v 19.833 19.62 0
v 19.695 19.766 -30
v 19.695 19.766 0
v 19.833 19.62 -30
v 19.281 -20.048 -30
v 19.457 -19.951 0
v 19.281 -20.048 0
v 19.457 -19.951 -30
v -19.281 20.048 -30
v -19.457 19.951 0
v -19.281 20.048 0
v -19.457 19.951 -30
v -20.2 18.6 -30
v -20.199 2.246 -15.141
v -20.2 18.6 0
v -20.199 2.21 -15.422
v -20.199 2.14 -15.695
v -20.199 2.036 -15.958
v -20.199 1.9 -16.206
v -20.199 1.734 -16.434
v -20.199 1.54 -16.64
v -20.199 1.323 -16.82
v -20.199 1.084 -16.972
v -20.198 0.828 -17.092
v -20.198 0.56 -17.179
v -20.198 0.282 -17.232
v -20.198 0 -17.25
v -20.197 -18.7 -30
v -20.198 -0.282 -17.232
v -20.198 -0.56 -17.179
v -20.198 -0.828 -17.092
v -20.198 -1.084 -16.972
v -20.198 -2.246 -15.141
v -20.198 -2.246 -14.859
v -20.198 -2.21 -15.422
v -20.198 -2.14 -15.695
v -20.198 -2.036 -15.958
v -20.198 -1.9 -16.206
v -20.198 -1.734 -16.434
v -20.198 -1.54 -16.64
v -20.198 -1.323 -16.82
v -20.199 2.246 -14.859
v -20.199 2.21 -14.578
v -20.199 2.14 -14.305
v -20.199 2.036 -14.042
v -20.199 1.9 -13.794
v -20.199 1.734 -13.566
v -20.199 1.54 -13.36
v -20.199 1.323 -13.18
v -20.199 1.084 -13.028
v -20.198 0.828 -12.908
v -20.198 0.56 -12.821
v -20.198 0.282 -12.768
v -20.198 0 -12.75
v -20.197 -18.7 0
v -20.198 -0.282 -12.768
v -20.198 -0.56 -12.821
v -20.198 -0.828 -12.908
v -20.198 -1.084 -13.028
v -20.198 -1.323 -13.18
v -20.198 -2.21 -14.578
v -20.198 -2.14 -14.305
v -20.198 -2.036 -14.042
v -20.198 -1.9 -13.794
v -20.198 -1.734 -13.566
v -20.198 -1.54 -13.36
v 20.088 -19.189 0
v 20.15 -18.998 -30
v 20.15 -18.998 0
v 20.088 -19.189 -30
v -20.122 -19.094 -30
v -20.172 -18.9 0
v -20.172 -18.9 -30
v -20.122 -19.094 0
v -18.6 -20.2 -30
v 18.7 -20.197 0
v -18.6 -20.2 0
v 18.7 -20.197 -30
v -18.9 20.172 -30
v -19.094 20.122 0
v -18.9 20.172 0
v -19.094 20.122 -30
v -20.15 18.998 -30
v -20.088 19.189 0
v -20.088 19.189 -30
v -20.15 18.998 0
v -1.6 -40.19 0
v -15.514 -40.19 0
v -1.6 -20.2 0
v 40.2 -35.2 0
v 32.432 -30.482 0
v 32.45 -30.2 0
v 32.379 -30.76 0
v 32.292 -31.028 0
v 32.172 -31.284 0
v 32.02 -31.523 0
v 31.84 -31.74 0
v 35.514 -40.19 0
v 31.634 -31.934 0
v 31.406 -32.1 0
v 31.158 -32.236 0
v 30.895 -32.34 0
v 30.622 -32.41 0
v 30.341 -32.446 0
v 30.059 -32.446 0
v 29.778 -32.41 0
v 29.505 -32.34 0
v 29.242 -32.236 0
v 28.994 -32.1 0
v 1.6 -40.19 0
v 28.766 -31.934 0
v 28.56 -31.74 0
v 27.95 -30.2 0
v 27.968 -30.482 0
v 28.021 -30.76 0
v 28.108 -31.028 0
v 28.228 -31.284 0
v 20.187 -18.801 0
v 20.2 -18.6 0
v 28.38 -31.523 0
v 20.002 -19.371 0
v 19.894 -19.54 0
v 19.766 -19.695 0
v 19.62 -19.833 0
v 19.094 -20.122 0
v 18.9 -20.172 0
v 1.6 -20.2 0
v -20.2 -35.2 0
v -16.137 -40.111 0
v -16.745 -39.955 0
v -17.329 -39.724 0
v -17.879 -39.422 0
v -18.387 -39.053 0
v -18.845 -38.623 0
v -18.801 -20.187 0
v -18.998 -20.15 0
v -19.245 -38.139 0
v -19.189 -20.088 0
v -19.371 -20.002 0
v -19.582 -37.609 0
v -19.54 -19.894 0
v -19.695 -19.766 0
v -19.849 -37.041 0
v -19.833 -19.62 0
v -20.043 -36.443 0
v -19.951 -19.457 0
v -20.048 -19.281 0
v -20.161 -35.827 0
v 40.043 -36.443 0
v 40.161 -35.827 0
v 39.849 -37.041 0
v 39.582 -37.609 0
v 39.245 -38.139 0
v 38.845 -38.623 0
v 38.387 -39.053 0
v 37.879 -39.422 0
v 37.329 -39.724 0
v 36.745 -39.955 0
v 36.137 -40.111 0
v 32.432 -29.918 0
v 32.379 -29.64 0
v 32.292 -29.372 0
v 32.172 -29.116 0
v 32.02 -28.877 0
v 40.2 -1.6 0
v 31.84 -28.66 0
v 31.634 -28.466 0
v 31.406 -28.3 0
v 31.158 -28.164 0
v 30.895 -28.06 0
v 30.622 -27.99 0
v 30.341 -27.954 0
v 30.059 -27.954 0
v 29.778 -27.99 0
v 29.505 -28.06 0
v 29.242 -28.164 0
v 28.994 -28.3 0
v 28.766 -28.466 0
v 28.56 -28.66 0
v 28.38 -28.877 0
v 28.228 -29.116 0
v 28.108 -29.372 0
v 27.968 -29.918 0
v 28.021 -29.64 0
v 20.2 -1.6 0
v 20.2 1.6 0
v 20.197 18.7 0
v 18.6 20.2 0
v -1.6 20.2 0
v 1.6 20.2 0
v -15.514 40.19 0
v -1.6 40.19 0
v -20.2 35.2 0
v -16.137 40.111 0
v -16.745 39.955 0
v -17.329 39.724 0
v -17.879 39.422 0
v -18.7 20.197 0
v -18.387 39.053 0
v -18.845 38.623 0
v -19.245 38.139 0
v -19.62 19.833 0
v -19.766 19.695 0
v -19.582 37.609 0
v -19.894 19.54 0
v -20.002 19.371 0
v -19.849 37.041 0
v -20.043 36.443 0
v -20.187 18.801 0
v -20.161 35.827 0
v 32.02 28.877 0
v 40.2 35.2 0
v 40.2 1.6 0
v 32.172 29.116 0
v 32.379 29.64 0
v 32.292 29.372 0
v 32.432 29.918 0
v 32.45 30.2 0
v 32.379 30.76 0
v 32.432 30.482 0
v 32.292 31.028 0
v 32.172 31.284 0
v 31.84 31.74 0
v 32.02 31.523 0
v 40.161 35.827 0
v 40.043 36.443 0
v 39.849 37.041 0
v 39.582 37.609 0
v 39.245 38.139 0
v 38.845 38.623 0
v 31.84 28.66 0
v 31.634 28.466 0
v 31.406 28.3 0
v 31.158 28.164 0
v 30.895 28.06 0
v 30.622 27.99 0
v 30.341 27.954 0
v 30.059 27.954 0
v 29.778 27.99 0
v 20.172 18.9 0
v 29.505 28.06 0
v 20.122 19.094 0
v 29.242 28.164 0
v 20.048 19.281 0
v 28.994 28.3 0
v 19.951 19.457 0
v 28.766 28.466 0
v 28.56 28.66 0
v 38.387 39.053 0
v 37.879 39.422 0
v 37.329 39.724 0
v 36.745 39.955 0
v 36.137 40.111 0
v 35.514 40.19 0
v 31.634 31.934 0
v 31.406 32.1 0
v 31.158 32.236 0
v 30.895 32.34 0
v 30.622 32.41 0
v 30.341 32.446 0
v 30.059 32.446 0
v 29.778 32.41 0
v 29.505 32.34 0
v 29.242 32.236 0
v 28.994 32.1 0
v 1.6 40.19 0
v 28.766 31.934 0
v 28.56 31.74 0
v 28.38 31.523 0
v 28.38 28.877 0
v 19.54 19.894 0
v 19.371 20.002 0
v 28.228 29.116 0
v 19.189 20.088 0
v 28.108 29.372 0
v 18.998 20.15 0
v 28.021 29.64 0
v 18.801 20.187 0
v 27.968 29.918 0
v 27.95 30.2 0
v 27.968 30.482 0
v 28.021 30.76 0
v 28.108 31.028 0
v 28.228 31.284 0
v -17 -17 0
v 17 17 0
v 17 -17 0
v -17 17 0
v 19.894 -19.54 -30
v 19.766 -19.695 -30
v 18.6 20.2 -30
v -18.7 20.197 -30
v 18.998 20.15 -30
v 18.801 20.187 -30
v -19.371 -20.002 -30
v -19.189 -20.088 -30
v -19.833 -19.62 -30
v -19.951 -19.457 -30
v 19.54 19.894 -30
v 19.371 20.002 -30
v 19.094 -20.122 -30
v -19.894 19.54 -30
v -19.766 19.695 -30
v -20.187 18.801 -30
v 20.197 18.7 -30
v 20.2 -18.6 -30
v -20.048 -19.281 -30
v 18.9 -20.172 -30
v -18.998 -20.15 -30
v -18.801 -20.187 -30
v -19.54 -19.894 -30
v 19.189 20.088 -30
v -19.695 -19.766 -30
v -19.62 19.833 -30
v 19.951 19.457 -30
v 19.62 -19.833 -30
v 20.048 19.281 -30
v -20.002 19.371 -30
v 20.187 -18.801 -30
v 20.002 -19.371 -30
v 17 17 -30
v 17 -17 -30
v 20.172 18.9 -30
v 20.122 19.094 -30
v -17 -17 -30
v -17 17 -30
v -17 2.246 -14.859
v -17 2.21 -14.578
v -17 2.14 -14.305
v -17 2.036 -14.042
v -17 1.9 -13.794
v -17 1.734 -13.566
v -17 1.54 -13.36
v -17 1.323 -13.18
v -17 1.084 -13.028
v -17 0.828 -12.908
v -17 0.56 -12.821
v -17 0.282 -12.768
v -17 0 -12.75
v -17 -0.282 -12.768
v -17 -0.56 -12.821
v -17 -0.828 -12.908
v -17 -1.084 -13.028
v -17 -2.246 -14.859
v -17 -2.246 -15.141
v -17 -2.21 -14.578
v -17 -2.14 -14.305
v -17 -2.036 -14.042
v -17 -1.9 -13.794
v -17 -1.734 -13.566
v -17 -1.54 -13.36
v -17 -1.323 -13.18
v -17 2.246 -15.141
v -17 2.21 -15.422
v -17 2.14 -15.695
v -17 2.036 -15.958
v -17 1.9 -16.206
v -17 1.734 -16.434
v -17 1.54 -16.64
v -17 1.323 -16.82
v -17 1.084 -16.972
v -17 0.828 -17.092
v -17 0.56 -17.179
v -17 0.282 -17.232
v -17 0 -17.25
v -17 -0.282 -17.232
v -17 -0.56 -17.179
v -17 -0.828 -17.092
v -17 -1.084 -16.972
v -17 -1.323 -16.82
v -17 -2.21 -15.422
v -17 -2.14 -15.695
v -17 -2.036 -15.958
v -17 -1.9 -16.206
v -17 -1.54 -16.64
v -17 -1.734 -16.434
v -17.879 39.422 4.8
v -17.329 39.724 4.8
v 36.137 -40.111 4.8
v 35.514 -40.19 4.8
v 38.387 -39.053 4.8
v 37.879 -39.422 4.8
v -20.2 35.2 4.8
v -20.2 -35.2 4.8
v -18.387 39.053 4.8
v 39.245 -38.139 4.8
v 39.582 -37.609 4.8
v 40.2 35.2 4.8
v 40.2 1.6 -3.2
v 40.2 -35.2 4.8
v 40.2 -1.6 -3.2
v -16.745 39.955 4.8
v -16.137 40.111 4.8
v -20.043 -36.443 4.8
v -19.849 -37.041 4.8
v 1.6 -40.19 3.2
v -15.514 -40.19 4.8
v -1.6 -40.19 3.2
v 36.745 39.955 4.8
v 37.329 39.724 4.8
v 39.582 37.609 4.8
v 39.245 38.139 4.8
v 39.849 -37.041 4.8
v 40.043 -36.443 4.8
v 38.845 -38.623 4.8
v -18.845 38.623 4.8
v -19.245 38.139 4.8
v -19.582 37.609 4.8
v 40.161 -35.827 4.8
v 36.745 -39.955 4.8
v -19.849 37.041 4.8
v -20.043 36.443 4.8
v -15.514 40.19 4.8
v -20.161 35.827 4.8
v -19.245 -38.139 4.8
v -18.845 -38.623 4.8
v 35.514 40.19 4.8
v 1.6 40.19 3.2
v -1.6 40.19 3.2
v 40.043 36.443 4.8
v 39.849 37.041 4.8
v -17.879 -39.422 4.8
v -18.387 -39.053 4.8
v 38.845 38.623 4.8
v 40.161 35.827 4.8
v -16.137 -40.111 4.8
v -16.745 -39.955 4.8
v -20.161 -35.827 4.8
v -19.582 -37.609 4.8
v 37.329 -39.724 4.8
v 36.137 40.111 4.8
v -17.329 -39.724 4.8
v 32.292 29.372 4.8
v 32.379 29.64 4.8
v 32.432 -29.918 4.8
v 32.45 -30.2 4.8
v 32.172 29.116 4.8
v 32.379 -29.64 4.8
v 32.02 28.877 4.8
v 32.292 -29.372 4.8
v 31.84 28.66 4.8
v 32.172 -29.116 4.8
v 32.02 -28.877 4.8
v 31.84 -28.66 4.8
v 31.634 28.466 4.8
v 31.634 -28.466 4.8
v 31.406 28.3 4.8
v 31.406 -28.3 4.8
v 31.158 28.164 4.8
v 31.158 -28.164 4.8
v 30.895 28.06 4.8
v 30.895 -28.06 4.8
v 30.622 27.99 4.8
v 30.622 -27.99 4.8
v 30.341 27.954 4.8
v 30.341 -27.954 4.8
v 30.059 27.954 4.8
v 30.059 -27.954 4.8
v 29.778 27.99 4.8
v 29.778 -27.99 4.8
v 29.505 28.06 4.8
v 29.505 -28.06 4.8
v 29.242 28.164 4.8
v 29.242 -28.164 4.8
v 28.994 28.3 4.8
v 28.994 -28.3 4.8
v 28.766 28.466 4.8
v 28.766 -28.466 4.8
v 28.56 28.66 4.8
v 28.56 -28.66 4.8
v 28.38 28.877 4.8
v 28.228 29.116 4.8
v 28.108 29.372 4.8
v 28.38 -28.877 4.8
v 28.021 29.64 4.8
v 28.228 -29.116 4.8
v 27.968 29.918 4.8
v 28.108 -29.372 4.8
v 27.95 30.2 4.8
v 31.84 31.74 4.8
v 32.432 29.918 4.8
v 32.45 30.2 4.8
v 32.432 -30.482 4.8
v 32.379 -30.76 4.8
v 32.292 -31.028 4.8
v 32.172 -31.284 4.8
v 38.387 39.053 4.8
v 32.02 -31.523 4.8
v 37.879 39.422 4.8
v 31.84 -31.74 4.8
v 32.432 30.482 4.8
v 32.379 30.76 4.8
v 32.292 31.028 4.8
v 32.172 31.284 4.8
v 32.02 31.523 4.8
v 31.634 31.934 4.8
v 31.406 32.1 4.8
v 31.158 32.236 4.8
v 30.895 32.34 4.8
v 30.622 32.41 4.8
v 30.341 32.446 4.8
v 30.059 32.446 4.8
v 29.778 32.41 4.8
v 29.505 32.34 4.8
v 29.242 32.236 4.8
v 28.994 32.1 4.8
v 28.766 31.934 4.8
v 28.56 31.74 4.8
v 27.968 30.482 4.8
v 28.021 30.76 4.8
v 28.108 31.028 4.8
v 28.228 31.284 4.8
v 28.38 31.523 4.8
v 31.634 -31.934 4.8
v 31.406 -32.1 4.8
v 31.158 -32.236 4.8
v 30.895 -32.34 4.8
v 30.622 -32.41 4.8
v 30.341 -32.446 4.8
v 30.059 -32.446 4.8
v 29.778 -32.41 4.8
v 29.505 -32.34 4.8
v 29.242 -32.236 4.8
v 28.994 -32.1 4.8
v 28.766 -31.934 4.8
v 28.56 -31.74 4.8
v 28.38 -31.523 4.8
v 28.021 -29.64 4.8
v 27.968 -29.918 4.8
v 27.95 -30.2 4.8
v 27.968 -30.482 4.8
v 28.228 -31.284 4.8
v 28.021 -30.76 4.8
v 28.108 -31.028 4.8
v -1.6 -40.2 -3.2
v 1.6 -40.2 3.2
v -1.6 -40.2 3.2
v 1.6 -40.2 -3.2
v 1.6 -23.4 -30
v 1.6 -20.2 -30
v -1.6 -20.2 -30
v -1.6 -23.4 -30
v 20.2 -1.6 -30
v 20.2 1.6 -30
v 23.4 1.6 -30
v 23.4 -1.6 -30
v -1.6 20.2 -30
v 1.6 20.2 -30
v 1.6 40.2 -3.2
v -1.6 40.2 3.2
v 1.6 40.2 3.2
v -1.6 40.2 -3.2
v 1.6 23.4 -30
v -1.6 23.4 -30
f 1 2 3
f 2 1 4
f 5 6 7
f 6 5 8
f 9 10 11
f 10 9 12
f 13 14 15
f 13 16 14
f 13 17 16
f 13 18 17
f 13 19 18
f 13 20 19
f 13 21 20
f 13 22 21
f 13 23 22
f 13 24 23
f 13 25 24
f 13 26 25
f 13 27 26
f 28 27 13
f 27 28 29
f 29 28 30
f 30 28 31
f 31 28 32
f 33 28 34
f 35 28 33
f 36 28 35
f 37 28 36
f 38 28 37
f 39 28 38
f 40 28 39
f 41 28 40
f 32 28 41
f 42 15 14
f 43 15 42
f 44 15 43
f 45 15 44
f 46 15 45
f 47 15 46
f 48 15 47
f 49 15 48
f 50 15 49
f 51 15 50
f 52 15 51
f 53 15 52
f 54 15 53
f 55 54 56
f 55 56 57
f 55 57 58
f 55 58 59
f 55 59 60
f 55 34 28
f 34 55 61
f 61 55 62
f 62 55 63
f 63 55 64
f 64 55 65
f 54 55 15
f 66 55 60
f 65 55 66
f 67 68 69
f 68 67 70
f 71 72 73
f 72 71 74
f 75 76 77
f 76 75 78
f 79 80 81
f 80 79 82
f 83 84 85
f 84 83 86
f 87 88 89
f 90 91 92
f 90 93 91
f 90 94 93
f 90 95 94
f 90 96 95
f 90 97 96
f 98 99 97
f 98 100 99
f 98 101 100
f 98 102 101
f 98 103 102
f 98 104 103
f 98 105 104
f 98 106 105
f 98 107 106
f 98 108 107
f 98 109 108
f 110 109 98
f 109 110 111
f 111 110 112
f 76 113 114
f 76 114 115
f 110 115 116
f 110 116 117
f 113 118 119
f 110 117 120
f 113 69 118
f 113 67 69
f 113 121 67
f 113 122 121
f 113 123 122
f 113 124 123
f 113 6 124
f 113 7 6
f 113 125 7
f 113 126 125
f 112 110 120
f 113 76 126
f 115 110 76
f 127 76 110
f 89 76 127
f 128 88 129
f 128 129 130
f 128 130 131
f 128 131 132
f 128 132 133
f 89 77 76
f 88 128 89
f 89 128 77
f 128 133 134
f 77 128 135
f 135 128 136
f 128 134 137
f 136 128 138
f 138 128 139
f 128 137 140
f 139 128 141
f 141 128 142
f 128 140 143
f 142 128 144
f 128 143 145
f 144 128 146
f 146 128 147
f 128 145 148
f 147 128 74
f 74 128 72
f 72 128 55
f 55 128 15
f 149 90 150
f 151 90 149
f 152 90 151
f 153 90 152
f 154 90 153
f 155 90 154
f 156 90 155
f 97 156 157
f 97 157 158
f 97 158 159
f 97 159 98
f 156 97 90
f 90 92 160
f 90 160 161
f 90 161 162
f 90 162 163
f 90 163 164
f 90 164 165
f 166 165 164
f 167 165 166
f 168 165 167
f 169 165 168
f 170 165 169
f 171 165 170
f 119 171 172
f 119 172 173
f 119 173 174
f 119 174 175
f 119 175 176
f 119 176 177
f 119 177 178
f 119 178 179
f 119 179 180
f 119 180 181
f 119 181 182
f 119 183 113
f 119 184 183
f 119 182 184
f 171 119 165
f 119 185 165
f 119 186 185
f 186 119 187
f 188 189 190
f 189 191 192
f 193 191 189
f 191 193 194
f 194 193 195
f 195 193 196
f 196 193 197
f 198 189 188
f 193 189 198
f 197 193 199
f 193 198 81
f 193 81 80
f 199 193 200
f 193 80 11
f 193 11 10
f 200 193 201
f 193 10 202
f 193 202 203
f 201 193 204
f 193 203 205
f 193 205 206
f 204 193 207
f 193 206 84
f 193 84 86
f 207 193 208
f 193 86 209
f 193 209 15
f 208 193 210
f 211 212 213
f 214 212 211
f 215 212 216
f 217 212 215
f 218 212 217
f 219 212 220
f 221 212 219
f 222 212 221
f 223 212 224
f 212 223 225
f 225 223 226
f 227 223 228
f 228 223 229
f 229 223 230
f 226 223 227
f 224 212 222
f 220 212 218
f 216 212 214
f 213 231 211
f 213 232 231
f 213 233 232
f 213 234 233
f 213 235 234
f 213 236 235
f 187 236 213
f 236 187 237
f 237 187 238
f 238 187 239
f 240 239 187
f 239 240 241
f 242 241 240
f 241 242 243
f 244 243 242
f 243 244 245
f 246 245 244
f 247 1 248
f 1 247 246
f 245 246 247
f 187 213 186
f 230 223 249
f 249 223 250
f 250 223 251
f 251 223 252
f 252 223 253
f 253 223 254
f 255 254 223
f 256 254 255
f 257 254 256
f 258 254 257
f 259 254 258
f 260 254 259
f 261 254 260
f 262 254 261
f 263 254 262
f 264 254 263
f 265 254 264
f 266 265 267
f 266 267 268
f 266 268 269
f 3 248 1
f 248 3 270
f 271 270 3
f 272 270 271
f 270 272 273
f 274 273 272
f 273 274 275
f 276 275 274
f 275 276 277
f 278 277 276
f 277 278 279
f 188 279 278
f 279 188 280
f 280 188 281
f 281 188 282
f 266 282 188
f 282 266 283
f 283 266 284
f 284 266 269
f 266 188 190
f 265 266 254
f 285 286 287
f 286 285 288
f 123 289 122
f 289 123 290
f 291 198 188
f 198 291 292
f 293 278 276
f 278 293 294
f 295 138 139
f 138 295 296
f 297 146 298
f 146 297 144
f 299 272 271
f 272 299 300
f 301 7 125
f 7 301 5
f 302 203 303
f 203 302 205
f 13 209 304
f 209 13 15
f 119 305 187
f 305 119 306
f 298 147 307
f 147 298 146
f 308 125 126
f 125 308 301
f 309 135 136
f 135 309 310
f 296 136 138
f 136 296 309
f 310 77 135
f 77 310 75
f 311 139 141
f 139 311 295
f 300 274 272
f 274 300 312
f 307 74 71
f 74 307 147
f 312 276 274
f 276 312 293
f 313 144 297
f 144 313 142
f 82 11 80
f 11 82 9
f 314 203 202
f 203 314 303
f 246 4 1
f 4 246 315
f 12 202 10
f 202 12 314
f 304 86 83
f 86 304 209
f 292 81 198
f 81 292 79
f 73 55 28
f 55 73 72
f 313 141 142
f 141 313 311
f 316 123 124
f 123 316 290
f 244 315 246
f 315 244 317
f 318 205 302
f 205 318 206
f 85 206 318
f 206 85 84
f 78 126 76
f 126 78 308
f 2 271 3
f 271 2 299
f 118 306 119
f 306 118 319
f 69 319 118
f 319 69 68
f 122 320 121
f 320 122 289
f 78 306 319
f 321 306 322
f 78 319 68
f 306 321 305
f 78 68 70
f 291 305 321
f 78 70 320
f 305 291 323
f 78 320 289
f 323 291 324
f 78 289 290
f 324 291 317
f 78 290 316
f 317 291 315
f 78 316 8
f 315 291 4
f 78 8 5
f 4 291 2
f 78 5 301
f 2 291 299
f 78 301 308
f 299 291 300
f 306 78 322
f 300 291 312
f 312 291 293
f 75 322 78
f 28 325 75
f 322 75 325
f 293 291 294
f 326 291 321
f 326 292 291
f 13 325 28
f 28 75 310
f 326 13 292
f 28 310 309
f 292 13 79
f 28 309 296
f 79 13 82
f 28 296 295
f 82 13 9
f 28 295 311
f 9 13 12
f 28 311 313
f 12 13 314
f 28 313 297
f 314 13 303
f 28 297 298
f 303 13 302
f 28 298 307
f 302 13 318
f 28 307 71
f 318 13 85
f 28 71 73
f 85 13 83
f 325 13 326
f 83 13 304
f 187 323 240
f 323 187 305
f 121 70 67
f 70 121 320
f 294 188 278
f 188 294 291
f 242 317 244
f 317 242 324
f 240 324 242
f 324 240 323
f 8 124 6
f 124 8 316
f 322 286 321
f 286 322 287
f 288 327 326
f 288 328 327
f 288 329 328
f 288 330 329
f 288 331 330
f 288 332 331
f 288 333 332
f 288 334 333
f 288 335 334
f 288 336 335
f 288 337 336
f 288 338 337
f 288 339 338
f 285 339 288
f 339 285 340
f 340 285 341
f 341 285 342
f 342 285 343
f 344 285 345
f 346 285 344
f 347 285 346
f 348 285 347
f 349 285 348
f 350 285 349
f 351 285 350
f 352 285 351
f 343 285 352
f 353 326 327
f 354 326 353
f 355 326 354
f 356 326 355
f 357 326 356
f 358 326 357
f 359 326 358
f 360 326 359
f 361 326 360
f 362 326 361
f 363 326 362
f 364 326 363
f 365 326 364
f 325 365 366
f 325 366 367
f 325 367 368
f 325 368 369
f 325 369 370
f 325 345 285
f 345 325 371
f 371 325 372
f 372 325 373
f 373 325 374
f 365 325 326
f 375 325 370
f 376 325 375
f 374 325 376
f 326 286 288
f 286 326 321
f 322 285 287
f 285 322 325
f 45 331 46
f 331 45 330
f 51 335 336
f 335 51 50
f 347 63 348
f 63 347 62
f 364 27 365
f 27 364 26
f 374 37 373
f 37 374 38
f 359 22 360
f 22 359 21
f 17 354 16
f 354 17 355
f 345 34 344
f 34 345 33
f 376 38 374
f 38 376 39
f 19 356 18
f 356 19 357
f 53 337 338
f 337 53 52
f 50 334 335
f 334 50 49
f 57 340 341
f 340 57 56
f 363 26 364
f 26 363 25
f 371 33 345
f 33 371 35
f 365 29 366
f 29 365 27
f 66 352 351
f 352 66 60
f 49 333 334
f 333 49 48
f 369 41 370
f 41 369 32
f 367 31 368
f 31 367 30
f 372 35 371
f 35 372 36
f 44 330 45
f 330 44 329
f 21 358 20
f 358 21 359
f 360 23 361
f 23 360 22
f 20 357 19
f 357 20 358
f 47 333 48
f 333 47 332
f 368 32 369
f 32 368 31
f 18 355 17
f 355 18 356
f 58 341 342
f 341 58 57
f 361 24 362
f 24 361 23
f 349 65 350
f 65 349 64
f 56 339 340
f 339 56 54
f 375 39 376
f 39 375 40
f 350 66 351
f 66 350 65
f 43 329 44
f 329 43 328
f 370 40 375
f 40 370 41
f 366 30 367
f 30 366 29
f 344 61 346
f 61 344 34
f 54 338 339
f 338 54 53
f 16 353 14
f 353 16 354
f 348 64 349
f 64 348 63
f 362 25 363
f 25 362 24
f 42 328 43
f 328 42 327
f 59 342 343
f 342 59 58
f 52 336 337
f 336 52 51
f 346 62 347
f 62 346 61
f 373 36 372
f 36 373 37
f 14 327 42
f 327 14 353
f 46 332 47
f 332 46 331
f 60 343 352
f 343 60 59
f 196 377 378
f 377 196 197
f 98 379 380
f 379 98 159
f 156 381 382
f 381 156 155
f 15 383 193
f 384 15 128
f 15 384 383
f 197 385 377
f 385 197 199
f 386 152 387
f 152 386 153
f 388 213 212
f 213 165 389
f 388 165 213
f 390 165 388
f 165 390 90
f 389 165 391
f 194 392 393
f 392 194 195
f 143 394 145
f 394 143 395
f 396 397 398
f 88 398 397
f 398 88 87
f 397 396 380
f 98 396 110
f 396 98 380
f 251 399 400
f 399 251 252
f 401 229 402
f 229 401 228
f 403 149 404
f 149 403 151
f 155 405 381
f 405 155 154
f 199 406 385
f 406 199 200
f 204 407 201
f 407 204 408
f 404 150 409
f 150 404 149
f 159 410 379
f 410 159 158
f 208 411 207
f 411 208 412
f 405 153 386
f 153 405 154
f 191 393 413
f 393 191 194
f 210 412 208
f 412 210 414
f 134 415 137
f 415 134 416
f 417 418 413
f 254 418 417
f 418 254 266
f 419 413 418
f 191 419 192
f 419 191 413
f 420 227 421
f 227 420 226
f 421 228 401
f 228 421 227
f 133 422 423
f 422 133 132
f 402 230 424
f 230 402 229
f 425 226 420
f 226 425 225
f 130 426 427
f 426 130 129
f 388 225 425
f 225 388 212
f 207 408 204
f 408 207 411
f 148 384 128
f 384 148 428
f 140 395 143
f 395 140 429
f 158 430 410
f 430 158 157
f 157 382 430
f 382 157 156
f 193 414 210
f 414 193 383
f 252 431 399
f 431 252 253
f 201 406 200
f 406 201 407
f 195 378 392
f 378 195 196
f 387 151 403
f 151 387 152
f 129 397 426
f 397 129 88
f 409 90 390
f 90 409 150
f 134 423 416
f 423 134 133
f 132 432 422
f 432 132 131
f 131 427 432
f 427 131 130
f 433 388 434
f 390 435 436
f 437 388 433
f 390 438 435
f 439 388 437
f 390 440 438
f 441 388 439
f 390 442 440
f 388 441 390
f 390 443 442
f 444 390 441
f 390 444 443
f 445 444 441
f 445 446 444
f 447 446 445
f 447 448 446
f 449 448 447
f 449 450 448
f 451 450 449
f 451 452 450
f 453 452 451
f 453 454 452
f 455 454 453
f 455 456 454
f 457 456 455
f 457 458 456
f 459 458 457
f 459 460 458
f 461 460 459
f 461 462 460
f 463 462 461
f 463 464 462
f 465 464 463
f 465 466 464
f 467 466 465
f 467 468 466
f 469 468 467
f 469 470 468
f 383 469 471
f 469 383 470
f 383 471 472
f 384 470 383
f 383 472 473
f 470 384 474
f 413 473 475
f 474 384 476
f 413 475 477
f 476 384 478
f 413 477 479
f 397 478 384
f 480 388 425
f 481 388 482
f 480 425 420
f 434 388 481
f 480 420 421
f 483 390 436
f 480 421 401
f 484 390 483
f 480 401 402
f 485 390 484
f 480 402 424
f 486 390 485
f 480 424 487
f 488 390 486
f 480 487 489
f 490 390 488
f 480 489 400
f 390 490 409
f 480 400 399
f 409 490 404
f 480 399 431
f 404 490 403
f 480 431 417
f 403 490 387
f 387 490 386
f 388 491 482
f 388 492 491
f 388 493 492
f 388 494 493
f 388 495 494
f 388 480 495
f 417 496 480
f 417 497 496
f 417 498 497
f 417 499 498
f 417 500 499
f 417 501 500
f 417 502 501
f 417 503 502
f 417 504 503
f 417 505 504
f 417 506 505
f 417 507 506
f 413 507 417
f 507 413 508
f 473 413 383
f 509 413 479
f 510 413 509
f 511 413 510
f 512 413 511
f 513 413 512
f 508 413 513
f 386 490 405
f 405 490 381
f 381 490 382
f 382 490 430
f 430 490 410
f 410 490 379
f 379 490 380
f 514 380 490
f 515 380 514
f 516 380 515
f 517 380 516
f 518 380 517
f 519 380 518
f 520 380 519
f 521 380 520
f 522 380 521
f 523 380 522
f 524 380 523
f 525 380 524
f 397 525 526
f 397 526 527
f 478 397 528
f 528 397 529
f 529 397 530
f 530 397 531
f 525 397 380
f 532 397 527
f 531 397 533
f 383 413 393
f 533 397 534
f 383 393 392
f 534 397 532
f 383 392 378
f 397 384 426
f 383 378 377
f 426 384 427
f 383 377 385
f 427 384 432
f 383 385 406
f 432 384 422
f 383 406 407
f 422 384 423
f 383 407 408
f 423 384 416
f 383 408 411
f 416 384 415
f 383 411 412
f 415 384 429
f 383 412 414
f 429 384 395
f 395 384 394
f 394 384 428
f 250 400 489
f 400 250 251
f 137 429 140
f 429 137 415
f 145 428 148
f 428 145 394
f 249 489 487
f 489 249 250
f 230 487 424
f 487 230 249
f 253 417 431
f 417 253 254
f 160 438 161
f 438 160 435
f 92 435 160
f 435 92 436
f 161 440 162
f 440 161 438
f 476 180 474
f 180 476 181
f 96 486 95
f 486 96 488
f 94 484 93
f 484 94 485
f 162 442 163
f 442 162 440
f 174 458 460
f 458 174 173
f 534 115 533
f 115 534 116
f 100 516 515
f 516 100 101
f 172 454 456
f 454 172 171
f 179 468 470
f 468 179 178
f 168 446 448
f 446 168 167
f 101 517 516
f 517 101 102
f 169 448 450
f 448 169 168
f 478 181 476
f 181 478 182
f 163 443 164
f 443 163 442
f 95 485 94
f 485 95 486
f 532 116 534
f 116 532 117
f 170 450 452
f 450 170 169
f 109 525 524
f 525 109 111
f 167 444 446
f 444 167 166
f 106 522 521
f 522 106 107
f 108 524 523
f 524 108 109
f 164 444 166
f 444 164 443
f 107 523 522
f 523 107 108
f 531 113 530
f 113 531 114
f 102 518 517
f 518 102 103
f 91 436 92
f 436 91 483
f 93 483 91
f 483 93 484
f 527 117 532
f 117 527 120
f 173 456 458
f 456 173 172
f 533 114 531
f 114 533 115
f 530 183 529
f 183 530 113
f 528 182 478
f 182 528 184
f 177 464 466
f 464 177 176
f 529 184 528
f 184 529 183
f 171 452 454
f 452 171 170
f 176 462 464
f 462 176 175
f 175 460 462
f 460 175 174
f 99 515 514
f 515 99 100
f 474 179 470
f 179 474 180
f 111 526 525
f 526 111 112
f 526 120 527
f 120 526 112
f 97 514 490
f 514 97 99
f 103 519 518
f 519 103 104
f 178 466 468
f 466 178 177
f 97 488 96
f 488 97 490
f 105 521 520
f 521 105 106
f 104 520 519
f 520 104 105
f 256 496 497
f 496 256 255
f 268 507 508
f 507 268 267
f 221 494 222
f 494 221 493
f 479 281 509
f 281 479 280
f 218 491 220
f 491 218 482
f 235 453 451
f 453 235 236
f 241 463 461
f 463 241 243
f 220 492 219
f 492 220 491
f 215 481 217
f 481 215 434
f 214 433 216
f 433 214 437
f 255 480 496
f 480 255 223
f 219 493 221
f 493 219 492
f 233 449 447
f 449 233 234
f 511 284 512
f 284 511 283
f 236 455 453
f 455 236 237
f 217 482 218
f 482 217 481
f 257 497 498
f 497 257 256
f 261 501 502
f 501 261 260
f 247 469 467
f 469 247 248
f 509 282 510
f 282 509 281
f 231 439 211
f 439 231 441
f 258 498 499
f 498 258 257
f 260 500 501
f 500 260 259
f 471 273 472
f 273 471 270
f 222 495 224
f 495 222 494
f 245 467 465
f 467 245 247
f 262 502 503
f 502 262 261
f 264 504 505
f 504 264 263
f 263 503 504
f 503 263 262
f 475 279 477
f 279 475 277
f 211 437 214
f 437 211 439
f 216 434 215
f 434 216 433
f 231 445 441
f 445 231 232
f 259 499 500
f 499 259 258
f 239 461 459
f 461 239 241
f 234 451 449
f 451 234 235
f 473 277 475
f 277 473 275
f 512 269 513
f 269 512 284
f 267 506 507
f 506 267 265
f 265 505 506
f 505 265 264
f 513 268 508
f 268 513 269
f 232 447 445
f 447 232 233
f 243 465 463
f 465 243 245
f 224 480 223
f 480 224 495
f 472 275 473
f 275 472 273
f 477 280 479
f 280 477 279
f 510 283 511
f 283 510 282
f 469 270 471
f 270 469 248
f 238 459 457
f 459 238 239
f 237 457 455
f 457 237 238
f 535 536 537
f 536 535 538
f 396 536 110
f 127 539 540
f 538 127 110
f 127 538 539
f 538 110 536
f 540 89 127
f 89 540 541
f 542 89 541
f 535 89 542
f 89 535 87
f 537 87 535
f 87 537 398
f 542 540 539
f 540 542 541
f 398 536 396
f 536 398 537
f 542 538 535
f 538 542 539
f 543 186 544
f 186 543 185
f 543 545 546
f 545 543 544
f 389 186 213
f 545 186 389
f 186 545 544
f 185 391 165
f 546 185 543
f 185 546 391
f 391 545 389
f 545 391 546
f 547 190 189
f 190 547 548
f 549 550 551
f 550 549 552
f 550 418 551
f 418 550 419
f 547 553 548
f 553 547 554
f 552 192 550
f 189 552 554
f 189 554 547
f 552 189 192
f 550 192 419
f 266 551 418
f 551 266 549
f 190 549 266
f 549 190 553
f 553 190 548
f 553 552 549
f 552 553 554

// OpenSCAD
// table leg top plate for upright

// input parameters
// timber
upright_width = 32;     // assumes square
upright_clearance=1;    // clearance each side
// socket dims
wall_thickness = 3.2;
wall_rad=1.6;
wall_height=30;
// top plate and stiffeners
corner_rad=5;
rib=3.2;
top_plate = 4.8;
screw_offset = 10;
screw_edge=10;
// clearance hole for screws
screw_dia = 4.5;

//working variables
corner_distance=(upright_width/2+upright_clearance+wall_thickness);
socket_width=upright_width+2*upright_clearance;
cap_edge=corner_distance+screw_offset+screw_edge;
screw_centre=corner_distance+screw_offset;

// smooth
$fn = 50;

//make the socket
{
    difference(){
        hull(){
            for (side=[0:90:360]) // sides = 1 to 4
                {
                    rotate([0,0,side])
                    translate([corner_distance-wall_rad,-(corner_distance-wall_rad),-wall_height/2])
                    cylinder(h=wall_height,r=wall_rad,center=true);
                }
        }
          
        translate([-socket_width/2,-socket_width/2,-(wall_height+1)])
          cube([socket_width,socket_width,wall_height+2]);
        translate([-corner_distance-1,0,-wall_height/2])
          rotate([0,90,0])
          cylinder(h=wall_thickness+2,d=screw_dia);
    }
}

// add the cap plate
{
    difference(){
        hull(){
            translate([corner_rad-corner_distance,corner_rad-cap_edge,top_plate/2])
                cylinder(h=top_plate,r=corner_rad,center=true);
            translate([cap_edge-corner_rad,corner_rad-cap_edge,top_plate/2])
                cylinder(h=top_plate,r=corner_rad,center=true);
            translate([cap_edge-corner_rad,cap_edge-corner_rad,top_plate/2])
                cylinder(h=top_plate,r=corner_rad,center=true);
            translate([corner_rad-corner_distance,cap_edge-corner_rad,top_plate/2])
                cylinder(h=top_plate,r=corner_rad,center=true);
            }
 
        translate([screw_centre,-screw_centre,top_plate/2])
            cylinder(h=top_plate+2,d=screw_dia,center=true);
        translate([screw_centre,screw_centre,top_plate/2])
            cylinder(h=top_plate+2,d=screw_dia,center=true);
        }
}

//And finally, stiffening ribs
for (side=[-90:90:90]) // sides = 1 to 3
    rotate([0,0,side])
    hull(){
        translate([corner_distance,-rib/2,-wall_height])
            cube(rib);
        translate([cap_edge-rib,-rib/2,-rib])
            cube(rib);
        translate([cap_edge-rib,-rib/2,0])
            cube(rib);
        translate([corner_distance,-rib/2,0])
            cube(rib);
    }
